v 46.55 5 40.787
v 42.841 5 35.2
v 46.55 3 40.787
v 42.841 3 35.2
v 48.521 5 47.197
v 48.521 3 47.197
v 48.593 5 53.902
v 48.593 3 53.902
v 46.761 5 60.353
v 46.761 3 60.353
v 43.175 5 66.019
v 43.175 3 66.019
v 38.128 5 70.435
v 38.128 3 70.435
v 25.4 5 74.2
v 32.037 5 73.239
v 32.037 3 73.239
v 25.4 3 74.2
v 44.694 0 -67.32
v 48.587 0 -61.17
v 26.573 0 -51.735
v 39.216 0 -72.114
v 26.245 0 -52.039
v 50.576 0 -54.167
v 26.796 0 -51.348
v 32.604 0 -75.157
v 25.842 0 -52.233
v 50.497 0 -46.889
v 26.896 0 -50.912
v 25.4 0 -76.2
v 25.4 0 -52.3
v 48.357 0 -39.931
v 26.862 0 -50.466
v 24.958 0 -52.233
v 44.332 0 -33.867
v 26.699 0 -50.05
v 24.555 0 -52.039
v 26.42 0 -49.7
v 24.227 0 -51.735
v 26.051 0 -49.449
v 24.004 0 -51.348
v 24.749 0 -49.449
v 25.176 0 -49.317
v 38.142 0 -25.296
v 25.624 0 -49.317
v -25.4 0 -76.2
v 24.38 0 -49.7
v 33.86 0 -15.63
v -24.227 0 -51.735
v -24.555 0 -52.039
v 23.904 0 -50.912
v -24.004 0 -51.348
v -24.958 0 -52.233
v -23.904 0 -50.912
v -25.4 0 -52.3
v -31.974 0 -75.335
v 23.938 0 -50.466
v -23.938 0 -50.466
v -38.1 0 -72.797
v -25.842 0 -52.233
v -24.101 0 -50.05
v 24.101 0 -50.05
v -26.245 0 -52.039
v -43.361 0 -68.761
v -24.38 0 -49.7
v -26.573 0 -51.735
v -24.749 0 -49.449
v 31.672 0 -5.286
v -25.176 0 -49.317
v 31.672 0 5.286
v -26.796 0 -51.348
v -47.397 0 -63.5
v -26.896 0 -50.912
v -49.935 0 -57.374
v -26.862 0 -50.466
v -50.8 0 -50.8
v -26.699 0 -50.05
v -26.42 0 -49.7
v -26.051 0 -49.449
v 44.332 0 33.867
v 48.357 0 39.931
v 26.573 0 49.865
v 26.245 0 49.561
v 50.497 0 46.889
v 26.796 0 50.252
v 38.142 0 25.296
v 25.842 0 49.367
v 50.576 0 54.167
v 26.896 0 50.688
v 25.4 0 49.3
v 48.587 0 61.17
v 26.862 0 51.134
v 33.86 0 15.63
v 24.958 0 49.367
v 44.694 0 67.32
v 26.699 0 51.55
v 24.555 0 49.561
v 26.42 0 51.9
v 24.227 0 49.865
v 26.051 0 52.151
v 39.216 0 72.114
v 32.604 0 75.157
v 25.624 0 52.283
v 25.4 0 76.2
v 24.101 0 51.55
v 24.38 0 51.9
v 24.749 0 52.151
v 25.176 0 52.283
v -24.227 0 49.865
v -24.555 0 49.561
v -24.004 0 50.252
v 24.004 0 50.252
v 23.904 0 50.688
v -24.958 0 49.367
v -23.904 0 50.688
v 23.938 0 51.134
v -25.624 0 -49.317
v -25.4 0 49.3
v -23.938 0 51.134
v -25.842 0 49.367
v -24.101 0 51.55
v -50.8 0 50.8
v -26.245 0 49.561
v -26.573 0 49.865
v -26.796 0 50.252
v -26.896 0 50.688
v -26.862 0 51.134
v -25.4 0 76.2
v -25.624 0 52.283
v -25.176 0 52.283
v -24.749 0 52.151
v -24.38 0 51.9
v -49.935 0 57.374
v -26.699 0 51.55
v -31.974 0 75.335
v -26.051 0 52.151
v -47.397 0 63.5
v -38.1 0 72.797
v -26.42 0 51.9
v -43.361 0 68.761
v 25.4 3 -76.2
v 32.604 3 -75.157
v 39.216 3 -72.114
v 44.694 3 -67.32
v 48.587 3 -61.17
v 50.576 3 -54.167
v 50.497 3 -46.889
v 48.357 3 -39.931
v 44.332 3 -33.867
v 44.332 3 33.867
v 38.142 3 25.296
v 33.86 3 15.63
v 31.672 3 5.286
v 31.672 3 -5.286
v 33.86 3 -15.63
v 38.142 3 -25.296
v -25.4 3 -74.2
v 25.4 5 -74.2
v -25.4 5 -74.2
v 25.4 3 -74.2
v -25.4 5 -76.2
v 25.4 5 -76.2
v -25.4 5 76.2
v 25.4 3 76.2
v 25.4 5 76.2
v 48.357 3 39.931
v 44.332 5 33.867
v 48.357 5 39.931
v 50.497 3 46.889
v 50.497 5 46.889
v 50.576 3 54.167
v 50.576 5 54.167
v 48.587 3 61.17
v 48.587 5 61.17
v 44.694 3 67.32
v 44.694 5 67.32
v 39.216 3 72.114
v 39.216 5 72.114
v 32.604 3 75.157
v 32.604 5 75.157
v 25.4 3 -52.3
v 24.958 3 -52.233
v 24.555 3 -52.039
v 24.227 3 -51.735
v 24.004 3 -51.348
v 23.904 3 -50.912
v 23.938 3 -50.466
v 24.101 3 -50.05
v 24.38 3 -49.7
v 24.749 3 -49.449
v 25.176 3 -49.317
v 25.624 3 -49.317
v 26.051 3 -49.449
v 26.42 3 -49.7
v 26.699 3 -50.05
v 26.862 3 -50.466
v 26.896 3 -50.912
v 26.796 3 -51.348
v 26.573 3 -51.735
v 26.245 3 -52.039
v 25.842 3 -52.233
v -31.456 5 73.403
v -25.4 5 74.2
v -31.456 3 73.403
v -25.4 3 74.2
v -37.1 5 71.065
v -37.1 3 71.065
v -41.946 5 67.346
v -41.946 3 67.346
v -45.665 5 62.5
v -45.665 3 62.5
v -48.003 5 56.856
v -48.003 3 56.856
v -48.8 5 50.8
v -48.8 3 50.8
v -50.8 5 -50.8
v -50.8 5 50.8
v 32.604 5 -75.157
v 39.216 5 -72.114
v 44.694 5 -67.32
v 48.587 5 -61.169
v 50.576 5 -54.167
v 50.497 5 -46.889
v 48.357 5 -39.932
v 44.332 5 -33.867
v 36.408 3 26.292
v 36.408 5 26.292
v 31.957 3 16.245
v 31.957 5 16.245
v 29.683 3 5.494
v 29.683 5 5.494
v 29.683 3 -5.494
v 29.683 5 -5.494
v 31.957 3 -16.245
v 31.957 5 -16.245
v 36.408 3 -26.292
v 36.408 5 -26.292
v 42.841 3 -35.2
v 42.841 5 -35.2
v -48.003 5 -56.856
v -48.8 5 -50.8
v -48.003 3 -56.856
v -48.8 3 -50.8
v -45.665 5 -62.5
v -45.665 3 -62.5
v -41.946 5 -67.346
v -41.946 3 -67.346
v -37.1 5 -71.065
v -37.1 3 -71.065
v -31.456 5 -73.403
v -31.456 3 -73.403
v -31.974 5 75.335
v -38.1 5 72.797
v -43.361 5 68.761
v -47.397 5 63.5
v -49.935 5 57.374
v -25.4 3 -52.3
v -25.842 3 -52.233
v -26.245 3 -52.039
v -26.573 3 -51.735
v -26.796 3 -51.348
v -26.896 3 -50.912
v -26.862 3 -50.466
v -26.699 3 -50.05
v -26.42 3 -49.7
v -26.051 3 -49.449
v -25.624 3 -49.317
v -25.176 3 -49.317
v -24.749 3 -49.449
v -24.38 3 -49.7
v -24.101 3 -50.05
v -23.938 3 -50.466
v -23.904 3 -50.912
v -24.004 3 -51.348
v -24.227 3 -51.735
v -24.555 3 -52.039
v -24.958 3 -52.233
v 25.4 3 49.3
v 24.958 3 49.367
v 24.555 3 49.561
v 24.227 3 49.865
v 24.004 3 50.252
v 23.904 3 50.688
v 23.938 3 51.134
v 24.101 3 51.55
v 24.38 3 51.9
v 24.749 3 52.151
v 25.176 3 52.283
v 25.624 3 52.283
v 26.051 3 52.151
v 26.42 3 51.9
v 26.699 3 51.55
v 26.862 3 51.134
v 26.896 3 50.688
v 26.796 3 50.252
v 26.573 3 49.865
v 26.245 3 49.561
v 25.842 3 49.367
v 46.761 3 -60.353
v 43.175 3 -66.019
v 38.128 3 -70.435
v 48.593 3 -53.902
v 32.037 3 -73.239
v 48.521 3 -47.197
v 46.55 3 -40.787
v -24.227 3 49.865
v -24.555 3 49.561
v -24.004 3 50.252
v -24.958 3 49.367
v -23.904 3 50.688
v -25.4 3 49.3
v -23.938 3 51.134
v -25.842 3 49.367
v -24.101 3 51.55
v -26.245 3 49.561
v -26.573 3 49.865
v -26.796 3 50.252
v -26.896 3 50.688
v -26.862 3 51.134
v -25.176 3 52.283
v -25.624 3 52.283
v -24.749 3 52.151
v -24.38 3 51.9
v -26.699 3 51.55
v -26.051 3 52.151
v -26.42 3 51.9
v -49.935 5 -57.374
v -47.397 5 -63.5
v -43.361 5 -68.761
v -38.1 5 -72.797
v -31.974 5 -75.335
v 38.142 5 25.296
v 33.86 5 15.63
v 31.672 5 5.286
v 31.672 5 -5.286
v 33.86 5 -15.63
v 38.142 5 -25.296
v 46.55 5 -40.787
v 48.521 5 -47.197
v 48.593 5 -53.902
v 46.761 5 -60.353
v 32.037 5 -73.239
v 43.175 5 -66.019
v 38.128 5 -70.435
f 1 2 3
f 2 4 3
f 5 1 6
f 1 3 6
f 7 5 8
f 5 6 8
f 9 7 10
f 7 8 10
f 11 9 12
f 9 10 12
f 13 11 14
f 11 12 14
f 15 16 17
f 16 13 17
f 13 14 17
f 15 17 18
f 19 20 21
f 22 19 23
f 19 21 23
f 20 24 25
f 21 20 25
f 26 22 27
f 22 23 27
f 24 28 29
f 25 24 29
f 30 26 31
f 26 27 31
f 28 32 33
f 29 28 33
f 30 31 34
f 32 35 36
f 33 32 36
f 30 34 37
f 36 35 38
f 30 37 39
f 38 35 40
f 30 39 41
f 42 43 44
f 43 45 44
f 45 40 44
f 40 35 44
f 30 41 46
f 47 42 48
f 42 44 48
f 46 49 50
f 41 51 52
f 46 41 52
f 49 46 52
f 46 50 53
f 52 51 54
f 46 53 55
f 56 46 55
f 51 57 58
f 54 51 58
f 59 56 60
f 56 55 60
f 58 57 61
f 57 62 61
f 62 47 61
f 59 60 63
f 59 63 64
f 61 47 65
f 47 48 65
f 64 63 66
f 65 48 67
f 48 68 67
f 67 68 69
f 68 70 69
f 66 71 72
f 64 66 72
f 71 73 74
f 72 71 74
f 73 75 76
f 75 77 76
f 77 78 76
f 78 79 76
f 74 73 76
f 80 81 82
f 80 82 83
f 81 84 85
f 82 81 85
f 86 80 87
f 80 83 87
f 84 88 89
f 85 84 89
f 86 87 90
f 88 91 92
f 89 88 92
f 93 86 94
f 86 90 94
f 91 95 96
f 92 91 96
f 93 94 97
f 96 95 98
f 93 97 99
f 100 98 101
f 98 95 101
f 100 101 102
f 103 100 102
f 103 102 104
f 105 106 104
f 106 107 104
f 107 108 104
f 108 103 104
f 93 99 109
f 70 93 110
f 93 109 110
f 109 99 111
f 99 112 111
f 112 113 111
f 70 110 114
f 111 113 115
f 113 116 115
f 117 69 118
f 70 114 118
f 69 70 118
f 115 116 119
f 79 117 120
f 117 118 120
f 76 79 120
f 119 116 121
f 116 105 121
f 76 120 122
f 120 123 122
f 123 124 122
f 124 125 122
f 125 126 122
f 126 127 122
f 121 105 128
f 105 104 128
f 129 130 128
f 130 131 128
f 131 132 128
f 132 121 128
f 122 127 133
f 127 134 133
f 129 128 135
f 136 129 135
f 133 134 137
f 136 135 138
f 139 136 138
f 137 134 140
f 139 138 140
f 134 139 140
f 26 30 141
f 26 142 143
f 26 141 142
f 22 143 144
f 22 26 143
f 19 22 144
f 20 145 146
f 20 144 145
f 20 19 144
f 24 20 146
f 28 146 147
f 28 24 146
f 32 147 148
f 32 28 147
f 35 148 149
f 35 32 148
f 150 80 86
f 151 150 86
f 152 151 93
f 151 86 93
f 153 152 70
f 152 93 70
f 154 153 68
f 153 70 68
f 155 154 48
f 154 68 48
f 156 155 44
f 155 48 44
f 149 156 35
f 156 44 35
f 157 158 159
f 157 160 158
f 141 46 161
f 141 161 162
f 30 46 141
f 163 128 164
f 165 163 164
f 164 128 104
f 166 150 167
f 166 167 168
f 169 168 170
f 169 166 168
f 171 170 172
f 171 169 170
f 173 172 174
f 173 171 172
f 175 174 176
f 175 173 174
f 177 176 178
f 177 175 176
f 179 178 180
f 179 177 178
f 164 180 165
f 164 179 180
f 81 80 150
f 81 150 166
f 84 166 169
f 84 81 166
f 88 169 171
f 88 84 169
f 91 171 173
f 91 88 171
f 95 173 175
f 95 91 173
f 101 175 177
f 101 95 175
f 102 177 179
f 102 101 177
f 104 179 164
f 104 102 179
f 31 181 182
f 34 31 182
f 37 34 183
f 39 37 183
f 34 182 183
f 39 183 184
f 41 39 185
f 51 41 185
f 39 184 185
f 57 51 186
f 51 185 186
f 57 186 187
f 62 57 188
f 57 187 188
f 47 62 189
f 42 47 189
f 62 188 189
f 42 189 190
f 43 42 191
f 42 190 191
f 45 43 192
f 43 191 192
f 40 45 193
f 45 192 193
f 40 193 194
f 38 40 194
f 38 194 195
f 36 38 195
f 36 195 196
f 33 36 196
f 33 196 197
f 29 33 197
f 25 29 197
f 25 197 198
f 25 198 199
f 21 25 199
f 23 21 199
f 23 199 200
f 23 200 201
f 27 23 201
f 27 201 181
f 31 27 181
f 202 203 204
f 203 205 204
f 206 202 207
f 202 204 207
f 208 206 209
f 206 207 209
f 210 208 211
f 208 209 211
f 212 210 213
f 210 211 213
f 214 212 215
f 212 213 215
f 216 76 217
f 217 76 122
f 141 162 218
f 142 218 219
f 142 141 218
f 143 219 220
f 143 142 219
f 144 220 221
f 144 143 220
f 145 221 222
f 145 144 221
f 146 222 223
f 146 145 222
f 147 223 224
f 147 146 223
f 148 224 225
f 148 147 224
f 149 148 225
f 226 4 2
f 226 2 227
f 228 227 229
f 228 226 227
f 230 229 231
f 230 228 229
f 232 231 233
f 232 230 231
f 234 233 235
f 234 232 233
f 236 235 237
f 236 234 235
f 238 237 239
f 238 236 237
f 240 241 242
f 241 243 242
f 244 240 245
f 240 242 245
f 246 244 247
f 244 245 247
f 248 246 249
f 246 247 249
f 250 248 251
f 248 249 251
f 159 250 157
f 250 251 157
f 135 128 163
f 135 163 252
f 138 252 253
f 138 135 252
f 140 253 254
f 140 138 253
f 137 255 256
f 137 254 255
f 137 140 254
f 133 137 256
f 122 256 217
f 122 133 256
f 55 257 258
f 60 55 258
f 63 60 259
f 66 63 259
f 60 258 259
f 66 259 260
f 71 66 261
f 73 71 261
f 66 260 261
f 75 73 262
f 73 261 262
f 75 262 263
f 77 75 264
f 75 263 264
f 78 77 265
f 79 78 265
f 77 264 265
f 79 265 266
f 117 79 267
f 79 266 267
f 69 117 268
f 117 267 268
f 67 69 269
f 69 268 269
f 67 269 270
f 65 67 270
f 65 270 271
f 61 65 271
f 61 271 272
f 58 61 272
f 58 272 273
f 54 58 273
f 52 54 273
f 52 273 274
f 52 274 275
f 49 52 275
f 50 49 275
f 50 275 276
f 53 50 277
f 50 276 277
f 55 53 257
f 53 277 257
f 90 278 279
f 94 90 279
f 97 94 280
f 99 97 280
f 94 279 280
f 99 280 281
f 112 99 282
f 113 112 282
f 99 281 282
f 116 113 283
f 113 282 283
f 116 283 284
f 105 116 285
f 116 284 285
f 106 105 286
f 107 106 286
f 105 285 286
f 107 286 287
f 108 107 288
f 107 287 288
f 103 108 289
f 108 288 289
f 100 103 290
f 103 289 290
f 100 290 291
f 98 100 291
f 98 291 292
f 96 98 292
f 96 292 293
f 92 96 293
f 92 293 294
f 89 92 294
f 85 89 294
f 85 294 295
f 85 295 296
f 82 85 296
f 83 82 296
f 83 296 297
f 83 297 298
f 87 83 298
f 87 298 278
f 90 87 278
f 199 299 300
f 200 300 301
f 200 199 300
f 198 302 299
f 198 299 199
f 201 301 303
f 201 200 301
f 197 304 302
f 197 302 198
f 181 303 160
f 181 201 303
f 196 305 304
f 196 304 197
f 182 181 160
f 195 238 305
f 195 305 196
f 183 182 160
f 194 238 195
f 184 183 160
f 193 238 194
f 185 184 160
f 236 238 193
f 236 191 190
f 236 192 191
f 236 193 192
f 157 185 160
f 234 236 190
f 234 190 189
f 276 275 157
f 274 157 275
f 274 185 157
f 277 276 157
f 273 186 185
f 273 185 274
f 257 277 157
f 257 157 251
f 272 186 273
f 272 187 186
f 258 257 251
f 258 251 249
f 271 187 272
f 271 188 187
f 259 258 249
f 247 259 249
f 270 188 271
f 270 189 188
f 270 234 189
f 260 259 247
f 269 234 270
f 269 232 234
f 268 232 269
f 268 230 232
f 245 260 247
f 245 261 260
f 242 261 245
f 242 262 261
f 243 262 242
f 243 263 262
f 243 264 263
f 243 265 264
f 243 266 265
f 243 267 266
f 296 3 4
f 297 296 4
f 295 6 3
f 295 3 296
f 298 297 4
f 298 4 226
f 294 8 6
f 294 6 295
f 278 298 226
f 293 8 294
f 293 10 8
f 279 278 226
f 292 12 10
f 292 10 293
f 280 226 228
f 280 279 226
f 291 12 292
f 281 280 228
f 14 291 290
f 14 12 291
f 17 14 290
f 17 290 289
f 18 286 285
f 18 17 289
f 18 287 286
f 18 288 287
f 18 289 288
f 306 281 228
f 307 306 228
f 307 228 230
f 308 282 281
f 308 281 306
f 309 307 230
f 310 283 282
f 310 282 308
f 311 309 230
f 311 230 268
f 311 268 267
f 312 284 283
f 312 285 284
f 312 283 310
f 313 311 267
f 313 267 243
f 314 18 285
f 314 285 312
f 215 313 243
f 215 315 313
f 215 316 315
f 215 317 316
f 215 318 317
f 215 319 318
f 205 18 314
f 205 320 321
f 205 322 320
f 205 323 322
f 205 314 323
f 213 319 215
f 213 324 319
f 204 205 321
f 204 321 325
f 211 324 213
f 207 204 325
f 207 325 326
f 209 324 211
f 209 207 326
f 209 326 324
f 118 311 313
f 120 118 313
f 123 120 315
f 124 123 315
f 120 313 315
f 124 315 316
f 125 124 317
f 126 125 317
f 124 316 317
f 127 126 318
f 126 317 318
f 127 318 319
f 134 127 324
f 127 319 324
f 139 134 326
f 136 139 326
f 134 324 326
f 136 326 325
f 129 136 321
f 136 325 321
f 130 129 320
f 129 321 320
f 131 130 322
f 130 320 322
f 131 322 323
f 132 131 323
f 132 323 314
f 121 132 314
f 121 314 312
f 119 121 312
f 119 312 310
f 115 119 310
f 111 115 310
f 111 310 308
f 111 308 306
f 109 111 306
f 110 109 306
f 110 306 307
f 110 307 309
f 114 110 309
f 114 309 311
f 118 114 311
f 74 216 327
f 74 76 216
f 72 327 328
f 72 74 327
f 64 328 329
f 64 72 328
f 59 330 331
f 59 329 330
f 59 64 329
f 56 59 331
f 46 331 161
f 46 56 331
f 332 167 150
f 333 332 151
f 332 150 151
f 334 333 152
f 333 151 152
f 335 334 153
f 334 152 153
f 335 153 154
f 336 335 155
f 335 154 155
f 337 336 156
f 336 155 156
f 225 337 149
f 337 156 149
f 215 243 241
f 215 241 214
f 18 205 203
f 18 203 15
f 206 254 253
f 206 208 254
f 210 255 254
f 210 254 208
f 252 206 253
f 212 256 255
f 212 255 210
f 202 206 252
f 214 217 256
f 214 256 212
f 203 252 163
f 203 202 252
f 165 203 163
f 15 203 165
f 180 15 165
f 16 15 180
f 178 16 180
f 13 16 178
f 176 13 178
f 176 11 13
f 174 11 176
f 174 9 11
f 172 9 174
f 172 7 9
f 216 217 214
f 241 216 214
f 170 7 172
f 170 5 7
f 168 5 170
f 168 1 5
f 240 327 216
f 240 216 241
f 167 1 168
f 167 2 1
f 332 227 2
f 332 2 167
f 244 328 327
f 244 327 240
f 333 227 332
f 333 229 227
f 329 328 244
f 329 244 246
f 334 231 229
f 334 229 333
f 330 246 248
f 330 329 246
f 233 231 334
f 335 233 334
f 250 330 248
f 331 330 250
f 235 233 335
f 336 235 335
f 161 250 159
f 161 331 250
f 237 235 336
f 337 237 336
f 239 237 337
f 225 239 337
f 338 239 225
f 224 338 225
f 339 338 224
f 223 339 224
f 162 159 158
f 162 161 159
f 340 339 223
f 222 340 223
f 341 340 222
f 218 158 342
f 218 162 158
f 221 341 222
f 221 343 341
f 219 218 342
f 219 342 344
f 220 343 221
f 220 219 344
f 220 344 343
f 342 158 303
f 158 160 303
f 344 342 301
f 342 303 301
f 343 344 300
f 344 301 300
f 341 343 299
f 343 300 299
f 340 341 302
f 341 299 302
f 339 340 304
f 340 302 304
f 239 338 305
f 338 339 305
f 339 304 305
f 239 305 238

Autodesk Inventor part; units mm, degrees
ref_plane "YZ Plane" through (0, 0, 0) normal (1, 0, 0) x (0, 1, 0)
ref_plane "XZ Plane" through (0, 0, 0) normal (0, 1, 0) x (-1, 0, 0)
ref_plane "XY Plane" through (0, 0, 0) normal (0, 0, 1) x (1, 0, 0)
sketch "Sketch1" plane through (0, 0, 0) normal (0, 1, 0) x (-1, 0, 0)
  line L0 (-25.4, 76.2) -> (25.4, 76.2)
  line L1 (-50.8, 50.8) -> (-50.8, -50.8)
  line L2 (50.8, 76.2) -> (-50.8, 76.2)
  line L3 (-25.4, -76.2) -> (25.4, -76.2)
  line L4 (50.8, -50.8) -> (50.8, 50.8)
  arc A0 (50.8, 50.8) -> (25.4, 76.2) centre (25.4, 50.8) ccw
  arc A1 (25.4, -76.2) -> (50.8, -50.8) centre (25.4, -50.8) ccw
  arc A2 (-50.8, -50.8) -> (-25.4, -76.2) centre (-25.4, -50.8) ccw
  arc A3 (-25.4, 76.2) -> (-50.8, 50.8) centre (-25.4, 50.8) ccw
  circle A4 centre (-25.4, 50.8) radius 25.4
  circle A5 centre (-25.4, -50.8) radius 25.4
  circle A6 centre (-50.8, 0) radius 31.3961
  circle A7 centre (-82.1961, 0) radius 50.8
  point P0 (-36.7592, 28.0815)
  point P1 (-36.7592, -28.0815)
  point P2 (-50.8, 31.3961)
  point P3 (-50.8, -31.3961)
  point P4 (-44.332, 33.8667)
  point P5 (-44.332, -33.8667)
  dimension "d6" = 101.6
  dimension "d21" = 25.4
extrude "Extrusion5" add sketch "Sketch1" along normal blind 3 contours A4 A3 | L0 A0 L4 A1 L3 A5 A6 A4 | A4 A6 A7 | A6 A7 | A5 A2 | A7 A6 A5
sketch "Sketch3" plane through (0, 3, 0) normal (0, 1, 0) x (1, 0, 0)
  arc A0 (-50.8, -50.8) -> (-25.4, -76.2) centre (-25.4, -50.8) ccw projected
  arc A1 (-50.8, -50.8) -> (-25.4, -76.2) centre (-25.4, -50.8) ccw
  arc A2 (-25.4, 76.2) -> (-50.8, 50.8) centre (-25.4, 50.8) ccw projected
  line L0 (-50.8, 50.8) -> (-50.8, -50.8) projected
  arc A3 (-25.4, 76.2) -> (-50.8, 50.8) centre (-25.4, 50.8) ccw
  arc A4 (25.4, -76.2) -> (44.332, -33.8667) centre (25.4, -50.8) ccw projected
  arc A5 (25.4, -76.2) -> (44.332, -33.8667) centre (25.4, -50.8) ccw
  arc A6 (44.332, 33.8667) -> (44.332, -33.8667) centre (82.1961, 0) ccw projected
  arc A7 (44.332, 33.8667) -> (44.332, -33.8667) centre (82.1961, 0) ccw
  arc A8 (44.332, 33.8667) -> (25.4, 76.2) centre (25.4, 50.8) ccw projected
  arc A9 (44.332, 33.8667) -> (25.4, 76.2) centre (25.4, 50.8) ccw
  line L1 (-50.8, -50.8) -> (-50.8, 50.8)
  line L2 (-25.4, -76.2) -> (25.4, -76.2) projected
  line L3 (-25.4, -76.2) -> (25.4, -76.2)
  line L4 (-25.4, 76.2) -> (25.4, 76.2)
  line L5 (-25.4, 76.2) -> (25.4, 76.2)
  line L6 (25.4, 76.2) -> (-25.4, 76.2)
  line L7 (25.4, 76.2) -> (-25.4, 76.2) projected
  line L8 (25.4, 76.2) -> (-25.4, 76.2)
  arc A10 (-48.8, -50.8) -> (-25.4, -74.2) centre (-25.4, -50.8) ccw
  line L9 (-25.4, -74.2) -> (25.4, -74.2)
  arc A11 (25.4, -74.2) -> (42.8413, -35.2) centre (25.4, -50.8) ccw
  arc A12 (42.8413, 35.2) -> (42.8413, -35.2) centre (82.1961, 0) ccw
  arc A13 (42.8413, 35.2) -> (25.4, 74.2) centre (25.4, 50.8) ccw
  line L10 (25.4, 74.2) -> (-25.4, 74.2)
  arc A14 (-25.4, 74.2) -> (-48.8, 50.8) centre (-25.4, 50.8) ccw
  line L11 (-48.8, 50.8) -> (-48.8, -50.8)
  point P0 (0, 0)
  dimension "d28" = 2
extrude "Extrusion6" add sketch "Sketch3" along normal blind 2
hole "Hole2" at (-25.4, 0, 50.8) at (25.4, 0, 50.8) at (25.4, 0, -50.8) at (-25.4, 0, -50.8) direction (0, 1, 0) diameter 3 depth 25.4 tip angle 118
properties part number "ControllerBottom"
